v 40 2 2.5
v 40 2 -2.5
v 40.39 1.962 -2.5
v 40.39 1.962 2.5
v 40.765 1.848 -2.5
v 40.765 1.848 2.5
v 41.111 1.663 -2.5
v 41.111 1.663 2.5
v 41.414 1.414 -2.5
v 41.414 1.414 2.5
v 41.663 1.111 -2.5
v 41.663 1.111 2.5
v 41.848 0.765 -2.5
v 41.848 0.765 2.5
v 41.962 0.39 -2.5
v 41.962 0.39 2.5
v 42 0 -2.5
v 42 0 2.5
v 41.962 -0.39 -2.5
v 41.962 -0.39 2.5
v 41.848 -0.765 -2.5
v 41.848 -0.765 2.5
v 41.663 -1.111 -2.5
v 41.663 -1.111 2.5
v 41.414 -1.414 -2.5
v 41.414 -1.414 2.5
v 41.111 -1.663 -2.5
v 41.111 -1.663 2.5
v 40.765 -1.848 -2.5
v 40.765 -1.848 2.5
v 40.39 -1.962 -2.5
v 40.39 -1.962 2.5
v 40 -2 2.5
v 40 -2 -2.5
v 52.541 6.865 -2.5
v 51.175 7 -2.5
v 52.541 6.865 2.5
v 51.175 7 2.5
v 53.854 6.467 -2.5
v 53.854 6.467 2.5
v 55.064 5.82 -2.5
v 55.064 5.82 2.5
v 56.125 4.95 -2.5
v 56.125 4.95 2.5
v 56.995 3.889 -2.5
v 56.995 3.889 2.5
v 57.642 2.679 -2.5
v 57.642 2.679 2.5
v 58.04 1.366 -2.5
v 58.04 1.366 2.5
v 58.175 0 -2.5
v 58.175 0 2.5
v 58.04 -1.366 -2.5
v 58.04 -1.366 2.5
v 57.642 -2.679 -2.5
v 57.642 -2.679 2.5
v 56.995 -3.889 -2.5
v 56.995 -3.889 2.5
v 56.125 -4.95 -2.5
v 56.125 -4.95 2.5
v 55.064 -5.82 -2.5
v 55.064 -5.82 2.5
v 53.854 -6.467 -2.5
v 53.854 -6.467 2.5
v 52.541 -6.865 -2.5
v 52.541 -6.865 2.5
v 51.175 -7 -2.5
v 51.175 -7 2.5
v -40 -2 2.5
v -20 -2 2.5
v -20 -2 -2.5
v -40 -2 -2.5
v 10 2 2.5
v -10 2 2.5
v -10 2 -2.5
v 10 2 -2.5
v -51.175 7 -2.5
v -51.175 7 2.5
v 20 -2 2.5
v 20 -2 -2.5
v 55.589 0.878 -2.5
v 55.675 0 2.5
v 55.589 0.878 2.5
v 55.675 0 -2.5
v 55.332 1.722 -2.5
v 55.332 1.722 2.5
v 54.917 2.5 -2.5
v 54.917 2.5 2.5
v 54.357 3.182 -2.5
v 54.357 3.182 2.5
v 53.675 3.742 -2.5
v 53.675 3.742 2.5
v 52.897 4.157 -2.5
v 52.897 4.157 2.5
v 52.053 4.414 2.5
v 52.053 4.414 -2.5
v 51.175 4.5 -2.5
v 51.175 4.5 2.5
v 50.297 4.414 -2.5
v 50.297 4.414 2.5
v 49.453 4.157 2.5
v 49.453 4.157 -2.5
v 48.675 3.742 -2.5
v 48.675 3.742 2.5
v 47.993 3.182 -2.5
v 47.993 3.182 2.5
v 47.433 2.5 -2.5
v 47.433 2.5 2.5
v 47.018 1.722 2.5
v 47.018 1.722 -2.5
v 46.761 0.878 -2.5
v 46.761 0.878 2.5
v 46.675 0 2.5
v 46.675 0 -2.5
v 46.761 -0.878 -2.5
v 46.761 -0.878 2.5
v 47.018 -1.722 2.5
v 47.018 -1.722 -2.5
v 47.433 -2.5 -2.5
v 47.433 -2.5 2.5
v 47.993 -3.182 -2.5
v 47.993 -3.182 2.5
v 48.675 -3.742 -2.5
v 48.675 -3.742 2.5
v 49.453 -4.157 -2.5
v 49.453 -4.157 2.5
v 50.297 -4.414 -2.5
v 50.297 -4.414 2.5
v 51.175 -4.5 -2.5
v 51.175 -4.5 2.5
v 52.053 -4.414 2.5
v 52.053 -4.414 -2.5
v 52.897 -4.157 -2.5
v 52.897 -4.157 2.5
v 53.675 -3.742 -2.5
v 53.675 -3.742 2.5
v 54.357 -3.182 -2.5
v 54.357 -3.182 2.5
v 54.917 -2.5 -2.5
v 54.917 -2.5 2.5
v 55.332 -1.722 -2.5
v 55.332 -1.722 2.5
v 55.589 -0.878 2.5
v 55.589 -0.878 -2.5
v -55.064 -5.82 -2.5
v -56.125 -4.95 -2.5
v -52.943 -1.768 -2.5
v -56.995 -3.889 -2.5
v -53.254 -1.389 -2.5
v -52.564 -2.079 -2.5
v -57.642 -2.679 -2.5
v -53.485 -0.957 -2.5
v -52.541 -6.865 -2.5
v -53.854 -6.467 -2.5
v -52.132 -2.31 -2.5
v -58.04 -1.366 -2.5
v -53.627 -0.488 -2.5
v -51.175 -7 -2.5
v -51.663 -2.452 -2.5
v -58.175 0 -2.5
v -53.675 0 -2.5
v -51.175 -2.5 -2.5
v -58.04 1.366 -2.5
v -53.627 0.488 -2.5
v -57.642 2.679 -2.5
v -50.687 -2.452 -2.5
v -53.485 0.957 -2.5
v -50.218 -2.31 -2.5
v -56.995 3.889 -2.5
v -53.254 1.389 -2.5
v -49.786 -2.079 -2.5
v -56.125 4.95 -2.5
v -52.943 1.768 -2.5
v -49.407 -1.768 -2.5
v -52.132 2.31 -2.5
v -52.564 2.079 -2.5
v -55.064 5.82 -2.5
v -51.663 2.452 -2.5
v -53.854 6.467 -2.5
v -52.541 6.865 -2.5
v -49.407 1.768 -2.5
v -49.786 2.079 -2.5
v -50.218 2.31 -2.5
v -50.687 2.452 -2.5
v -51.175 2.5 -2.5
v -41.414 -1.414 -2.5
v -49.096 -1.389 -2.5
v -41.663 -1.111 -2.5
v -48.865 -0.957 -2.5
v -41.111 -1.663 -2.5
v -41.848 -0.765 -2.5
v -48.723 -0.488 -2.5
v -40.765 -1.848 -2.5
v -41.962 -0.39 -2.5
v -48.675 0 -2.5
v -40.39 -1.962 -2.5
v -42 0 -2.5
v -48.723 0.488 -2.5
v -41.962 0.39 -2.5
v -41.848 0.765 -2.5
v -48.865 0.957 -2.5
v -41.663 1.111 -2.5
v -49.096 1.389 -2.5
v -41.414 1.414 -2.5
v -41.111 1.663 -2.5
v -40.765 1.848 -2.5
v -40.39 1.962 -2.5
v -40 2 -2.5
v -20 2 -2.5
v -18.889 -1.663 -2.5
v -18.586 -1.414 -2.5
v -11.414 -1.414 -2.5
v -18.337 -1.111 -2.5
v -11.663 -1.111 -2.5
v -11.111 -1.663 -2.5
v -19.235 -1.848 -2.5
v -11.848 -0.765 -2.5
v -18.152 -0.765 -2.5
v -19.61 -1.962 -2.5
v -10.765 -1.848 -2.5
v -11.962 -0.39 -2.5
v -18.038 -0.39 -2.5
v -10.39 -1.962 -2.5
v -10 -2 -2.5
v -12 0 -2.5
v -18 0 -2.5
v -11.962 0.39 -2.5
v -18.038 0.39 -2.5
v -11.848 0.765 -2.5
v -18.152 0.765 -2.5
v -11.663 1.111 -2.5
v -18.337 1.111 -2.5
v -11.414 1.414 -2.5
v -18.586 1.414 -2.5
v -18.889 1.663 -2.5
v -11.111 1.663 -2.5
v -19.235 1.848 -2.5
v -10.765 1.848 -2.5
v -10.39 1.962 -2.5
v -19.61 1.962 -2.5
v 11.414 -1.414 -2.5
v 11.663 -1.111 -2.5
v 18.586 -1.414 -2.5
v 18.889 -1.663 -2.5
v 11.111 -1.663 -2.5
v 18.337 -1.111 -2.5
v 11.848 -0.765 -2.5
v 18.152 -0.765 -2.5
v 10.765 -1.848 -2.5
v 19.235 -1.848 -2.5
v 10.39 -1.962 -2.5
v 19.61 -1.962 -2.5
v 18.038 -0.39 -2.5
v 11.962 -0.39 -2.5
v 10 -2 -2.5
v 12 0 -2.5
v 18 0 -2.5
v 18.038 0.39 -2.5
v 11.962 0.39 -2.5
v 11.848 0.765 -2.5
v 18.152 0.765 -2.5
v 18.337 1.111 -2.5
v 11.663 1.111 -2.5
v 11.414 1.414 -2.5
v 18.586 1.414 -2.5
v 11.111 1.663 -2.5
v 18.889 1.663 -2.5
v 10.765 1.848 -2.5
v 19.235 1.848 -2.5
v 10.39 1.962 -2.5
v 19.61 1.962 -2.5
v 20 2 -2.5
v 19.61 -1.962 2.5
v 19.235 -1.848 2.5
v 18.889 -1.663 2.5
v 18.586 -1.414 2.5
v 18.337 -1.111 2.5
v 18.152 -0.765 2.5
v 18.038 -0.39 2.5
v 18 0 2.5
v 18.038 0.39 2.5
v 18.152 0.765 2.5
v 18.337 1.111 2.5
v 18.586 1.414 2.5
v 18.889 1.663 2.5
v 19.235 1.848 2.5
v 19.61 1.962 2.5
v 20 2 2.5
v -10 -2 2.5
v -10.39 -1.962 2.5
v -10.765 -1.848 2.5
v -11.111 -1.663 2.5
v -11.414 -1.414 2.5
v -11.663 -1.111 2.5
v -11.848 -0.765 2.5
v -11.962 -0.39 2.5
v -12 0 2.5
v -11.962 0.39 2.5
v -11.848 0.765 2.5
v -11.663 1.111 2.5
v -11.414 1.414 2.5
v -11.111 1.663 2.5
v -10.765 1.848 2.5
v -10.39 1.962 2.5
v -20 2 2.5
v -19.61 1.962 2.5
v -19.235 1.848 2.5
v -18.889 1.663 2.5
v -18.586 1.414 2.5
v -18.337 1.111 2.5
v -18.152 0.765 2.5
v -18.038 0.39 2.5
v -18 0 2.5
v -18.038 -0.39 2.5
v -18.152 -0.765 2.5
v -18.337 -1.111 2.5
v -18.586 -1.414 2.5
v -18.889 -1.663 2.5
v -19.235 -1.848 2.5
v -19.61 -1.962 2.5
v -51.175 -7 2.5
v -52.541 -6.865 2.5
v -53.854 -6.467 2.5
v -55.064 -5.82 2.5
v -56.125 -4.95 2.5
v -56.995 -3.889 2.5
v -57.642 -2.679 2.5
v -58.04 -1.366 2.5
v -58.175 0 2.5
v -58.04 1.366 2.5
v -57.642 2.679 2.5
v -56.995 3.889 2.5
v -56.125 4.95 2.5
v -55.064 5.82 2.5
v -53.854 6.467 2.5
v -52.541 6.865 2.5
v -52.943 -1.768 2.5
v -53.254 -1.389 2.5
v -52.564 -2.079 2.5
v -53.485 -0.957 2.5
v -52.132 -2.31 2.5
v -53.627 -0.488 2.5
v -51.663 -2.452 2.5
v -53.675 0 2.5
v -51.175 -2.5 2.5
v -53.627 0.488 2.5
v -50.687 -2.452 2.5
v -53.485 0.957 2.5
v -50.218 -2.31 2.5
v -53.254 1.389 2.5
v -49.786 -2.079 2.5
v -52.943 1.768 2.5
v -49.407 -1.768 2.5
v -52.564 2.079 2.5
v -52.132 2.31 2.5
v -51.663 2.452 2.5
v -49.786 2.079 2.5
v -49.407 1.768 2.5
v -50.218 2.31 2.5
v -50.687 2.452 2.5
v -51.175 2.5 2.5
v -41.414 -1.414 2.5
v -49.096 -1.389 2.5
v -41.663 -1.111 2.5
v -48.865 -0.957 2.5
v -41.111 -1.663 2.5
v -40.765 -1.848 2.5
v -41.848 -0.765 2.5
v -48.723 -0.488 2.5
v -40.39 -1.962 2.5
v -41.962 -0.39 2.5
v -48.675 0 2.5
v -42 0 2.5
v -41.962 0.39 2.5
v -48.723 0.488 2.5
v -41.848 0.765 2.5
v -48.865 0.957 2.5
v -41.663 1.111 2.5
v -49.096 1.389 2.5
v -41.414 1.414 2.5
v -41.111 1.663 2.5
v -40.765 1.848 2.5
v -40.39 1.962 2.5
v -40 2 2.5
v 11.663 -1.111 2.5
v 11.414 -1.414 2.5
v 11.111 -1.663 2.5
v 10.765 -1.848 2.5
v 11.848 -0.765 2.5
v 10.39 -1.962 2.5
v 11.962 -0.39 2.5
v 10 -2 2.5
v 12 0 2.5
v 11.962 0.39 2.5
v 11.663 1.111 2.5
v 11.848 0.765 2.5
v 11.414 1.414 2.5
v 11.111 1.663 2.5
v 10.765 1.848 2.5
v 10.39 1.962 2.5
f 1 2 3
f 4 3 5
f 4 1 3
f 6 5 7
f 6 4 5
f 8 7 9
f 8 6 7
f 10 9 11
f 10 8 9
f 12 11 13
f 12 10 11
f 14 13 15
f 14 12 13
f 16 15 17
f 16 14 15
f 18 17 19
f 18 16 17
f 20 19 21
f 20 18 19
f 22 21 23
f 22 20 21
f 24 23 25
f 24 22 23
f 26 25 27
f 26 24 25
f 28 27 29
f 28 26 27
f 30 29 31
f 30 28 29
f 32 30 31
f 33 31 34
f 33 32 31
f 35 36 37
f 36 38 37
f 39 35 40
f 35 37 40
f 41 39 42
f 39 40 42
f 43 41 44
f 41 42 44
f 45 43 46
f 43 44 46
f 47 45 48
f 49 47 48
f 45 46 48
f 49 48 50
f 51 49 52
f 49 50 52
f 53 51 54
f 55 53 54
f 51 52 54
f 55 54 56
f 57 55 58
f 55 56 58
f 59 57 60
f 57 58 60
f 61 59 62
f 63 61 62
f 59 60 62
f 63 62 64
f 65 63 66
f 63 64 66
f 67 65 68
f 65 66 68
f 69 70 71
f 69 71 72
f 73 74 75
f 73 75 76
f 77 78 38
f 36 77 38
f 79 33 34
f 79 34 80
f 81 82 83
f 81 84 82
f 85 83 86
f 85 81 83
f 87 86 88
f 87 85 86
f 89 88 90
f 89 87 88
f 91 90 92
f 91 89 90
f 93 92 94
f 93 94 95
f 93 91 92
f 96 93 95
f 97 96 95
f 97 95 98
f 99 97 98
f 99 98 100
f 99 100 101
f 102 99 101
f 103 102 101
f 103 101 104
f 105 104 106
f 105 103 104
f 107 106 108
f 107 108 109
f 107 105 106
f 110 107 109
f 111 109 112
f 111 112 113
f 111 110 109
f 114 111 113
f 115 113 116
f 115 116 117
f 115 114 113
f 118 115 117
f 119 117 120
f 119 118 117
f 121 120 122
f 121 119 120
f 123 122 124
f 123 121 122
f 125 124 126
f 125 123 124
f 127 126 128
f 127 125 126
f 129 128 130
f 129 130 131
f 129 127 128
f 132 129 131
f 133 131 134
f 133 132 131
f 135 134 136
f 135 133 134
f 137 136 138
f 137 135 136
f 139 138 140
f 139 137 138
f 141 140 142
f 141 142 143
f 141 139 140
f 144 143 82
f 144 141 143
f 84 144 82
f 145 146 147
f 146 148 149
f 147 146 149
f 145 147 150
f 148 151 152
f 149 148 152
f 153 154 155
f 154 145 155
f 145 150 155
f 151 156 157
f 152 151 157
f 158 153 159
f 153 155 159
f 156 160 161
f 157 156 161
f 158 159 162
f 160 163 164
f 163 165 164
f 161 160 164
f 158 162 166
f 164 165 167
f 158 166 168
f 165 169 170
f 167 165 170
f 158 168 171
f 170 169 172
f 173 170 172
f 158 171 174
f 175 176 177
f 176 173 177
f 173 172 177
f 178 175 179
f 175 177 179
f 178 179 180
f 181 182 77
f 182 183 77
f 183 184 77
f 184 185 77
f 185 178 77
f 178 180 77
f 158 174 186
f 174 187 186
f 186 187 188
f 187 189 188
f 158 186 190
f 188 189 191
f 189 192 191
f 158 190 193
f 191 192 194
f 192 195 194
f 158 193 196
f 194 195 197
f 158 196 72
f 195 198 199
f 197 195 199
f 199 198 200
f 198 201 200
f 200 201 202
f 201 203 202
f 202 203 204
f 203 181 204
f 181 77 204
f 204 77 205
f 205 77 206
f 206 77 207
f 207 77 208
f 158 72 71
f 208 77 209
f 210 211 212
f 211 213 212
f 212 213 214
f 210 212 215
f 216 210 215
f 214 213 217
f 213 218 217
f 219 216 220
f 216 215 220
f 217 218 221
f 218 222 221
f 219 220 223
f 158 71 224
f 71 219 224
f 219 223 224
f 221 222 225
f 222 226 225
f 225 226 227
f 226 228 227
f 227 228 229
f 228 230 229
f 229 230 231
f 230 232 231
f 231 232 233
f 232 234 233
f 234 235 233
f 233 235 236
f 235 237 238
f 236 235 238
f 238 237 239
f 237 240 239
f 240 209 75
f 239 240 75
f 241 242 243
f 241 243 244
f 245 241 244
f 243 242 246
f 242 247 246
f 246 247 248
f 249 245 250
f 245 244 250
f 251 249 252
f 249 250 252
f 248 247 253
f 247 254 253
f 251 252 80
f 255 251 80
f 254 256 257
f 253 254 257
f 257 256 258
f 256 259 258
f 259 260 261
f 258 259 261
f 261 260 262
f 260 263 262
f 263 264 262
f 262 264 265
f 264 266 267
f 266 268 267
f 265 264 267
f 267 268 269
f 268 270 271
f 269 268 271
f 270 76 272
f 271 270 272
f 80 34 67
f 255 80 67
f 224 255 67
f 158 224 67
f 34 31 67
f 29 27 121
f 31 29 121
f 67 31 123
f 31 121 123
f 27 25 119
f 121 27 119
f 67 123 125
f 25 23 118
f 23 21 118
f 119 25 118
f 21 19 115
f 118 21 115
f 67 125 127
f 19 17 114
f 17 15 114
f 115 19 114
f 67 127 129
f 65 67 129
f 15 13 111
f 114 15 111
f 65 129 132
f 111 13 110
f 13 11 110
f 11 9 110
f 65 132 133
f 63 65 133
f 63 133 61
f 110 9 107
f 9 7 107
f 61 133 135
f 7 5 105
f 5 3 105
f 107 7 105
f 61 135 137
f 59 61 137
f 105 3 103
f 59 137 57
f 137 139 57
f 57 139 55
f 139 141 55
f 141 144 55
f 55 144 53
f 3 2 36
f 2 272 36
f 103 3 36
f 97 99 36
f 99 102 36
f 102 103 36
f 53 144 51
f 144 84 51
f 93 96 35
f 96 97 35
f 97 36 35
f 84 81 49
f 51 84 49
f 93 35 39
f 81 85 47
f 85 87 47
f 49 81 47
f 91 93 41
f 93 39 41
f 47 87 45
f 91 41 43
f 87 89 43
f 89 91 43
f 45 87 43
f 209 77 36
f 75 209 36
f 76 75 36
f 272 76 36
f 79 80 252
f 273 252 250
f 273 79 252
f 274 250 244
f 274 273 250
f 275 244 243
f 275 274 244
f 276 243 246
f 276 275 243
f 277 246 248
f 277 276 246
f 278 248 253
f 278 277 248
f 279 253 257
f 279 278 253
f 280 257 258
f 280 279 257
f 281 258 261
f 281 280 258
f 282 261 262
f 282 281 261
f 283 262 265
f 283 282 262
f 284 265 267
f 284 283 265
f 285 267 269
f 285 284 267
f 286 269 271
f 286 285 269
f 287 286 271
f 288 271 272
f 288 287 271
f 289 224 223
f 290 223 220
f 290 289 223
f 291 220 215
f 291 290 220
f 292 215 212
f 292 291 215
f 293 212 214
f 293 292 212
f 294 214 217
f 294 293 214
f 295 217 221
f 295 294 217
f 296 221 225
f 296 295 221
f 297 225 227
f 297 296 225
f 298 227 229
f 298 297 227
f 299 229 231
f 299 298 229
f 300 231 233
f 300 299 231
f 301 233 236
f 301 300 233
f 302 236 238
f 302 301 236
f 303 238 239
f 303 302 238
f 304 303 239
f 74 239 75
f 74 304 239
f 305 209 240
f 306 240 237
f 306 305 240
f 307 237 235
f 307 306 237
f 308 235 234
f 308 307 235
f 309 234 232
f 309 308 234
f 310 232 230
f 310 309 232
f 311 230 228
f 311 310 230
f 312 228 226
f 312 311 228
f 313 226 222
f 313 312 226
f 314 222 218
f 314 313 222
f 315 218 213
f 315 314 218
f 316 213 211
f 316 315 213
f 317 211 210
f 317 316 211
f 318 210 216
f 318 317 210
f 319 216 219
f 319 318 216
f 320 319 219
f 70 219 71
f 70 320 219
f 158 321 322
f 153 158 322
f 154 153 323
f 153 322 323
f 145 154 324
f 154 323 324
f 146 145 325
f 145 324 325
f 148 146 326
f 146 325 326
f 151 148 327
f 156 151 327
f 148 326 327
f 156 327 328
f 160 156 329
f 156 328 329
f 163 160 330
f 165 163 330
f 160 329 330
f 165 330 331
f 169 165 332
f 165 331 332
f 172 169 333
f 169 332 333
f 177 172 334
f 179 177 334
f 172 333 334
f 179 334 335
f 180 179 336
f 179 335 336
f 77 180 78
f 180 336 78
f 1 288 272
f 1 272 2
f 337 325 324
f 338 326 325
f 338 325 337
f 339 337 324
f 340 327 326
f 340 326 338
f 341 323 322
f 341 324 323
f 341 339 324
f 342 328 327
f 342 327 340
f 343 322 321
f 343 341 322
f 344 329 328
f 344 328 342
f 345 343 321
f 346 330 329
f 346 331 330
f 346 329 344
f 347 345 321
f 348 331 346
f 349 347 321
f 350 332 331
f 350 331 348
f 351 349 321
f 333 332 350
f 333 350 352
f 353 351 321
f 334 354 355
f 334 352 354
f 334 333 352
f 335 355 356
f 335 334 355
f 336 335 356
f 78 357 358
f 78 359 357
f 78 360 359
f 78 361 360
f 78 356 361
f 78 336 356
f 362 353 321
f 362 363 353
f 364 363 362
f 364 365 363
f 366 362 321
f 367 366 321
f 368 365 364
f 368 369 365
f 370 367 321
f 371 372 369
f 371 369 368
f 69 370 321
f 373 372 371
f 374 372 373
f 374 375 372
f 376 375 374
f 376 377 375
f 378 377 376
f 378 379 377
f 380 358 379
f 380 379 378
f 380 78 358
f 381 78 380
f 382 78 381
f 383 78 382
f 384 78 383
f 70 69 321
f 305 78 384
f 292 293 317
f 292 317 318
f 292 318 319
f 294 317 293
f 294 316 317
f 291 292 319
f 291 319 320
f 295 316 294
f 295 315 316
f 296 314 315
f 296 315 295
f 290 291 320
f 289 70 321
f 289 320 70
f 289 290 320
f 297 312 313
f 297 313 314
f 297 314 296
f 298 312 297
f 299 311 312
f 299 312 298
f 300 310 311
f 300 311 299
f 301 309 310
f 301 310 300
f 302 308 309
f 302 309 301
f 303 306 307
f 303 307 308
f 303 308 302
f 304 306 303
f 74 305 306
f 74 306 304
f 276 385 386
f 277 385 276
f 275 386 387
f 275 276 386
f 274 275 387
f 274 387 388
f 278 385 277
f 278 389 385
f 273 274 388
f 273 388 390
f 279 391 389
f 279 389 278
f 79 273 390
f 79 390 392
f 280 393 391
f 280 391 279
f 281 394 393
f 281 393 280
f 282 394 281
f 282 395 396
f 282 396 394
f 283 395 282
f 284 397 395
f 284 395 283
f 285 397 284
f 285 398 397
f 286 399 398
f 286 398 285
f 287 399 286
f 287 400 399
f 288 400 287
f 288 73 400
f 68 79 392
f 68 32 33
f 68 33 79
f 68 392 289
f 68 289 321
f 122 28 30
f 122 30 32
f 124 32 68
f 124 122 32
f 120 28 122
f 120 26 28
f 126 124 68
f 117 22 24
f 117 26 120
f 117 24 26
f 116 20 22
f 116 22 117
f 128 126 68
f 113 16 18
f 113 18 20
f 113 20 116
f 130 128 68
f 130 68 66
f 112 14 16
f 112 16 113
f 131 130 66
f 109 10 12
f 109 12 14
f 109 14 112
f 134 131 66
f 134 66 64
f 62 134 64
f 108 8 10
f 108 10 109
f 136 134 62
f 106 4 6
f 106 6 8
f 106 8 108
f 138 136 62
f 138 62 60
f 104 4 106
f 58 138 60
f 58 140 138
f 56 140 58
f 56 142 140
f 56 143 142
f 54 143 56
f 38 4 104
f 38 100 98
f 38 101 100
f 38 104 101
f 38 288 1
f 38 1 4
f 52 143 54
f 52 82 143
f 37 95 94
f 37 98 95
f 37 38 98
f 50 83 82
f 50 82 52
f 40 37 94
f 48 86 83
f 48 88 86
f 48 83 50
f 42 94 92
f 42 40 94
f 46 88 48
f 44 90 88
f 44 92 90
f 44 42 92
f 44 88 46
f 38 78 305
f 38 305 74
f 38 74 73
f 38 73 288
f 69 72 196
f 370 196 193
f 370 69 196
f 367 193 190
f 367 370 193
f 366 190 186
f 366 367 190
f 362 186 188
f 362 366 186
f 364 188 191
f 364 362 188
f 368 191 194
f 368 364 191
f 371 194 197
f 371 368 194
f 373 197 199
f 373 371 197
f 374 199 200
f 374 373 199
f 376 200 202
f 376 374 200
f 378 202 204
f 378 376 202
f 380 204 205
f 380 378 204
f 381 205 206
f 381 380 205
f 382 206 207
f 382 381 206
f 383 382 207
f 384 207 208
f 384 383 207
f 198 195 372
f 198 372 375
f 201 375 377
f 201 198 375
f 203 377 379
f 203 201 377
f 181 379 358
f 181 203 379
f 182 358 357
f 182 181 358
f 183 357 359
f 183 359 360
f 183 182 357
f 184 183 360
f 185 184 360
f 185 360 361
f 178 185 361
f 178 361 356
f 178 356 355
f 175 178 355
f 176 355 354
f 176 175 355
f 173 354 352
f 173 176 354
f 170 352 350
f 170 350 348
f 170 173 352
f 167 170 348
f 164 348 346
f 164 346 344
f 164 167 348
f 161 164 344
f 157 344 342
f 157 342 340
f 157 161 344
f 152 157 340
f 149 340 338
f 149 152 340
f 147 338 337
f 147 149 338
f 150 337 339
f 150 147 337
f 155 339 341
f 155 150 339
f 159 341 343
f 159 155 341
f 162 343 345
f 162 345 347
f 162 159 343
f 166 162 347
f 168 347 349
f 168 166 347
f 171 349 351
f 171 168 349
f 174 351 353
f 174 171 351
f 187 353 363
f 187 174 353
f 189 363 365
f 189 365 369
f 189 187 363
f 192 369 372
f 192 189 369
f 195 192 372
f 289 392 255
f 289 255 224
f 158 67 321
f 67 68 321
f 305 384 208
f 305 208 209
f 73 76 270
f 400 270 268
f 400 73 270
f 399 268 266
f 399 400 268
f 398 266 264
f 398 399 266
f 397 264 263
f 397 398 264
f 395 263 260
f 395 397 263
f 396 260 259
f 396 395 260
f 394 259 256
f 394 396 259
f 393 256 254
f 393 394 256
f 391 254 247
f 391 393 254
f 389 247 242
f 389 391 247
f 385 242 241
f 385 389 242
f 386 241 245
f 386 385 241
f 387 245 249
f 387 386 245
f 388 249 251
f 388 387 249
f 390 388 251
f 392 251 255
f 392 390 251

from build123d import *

# Parameters (mm, degrees)
SKETCH_2_R                 = 4.5
EXTRUDE_1_DEPTH            = 2.5
CUT_EXTRUDE_1_DEPTH        = 10
PATTERN_LINEAR_1_COUNT     = 2
PATTERN_LINEAR_1_PITCH     = 30
PATTERN_LINEAR_1_COL_COUNT = 2
PATTERN_LINEAR_1_COL_PITCH = 30
EXTRUDE_START              = -5
SKETCH_5_R                 = 4.5
SKETCH_5_R_2               = 2.5
EXTRUDE_3_DEPTH            = 5


with BuildPart() as part:
    # 草图2 → 凸台-拉伸1 (new, symmetric)
    with BuildSketch(Plane.XY):
        with BuildLine():
            Line((-51.175, 7), (51.175, 7))
            ThreePointArc((51.175, 7), (58.175, 0), (51.175, -7))
            Line((51.175, -7), (-51.175, -7))
            ThreePointArc((-51.175, -7), (-58.175, 0), (-51.175, 7))
        make_face()
        with Locations((51.175, 0)):
            Circle(SKETCH_2_R, mode=Mode.SUBTRACT)
        with Locations((-51.175, 0)):
            Circle(SKETCH_2_R, mode=Mode.SUBTRACT)
    extrude(amount=EXTRUDE_1_DEPTH, both=True)

    # 草图3 → 切除-拉伸1 (cut)
    with BuildSketch(Plane.XY.offset(2.5)):
        with BuildLine():
            Line((-10, 2), (10, 2))
            ThreePointArc((10, 2), (12, 0), (10, -2))
            Line((10, -2), (-10, -2))
            ThreePointArc((-10, -2), (-12, 0), (-10, 2))
        make_face()
    cut_extrude_1 = extrude(amount=-CUT_EXTRUDE_1_DEPTH, mode=Mode.SUBTRACT)

    # 阵列(线性)1: 切除-拉伸1 ×2
    with Locations(*[(-i * PATTERN_LINEAR_1_PITCH, 0, 0) for i in range(1, PATTERN_LINEAR_1_COUNT)]):
        add(cut_extrude_1, mode=Mode.SUBTRACT)

    # 阵列(线性)1 col: 切除-拉伸1 ×2
    with Locations(*[(i * PATTERN_LINEAR_1_COL_PITCH, 0, 0) for i in range(1, PATTERN_LINEAR_1_COL_COUNT)]):
        add(cut_extrude_1, mode=Mode.SUBTRACT)

    # 草图5 → 凸台-拉伸3 (add)
    with BuildSketch(Plane.XY.offset(2.5).offset(EXTRUDE_START)):
        with Locations((-51.175, 0)):
            Circle(SKETCH_5_R)
        with Locations((-51.175, 0)):
            Circle(SKETCH_5_R_2, mode=Mode.SUBTRACT)
    extrude(amount=EXTRUDE_3_DEPTH)


solid = part.part
